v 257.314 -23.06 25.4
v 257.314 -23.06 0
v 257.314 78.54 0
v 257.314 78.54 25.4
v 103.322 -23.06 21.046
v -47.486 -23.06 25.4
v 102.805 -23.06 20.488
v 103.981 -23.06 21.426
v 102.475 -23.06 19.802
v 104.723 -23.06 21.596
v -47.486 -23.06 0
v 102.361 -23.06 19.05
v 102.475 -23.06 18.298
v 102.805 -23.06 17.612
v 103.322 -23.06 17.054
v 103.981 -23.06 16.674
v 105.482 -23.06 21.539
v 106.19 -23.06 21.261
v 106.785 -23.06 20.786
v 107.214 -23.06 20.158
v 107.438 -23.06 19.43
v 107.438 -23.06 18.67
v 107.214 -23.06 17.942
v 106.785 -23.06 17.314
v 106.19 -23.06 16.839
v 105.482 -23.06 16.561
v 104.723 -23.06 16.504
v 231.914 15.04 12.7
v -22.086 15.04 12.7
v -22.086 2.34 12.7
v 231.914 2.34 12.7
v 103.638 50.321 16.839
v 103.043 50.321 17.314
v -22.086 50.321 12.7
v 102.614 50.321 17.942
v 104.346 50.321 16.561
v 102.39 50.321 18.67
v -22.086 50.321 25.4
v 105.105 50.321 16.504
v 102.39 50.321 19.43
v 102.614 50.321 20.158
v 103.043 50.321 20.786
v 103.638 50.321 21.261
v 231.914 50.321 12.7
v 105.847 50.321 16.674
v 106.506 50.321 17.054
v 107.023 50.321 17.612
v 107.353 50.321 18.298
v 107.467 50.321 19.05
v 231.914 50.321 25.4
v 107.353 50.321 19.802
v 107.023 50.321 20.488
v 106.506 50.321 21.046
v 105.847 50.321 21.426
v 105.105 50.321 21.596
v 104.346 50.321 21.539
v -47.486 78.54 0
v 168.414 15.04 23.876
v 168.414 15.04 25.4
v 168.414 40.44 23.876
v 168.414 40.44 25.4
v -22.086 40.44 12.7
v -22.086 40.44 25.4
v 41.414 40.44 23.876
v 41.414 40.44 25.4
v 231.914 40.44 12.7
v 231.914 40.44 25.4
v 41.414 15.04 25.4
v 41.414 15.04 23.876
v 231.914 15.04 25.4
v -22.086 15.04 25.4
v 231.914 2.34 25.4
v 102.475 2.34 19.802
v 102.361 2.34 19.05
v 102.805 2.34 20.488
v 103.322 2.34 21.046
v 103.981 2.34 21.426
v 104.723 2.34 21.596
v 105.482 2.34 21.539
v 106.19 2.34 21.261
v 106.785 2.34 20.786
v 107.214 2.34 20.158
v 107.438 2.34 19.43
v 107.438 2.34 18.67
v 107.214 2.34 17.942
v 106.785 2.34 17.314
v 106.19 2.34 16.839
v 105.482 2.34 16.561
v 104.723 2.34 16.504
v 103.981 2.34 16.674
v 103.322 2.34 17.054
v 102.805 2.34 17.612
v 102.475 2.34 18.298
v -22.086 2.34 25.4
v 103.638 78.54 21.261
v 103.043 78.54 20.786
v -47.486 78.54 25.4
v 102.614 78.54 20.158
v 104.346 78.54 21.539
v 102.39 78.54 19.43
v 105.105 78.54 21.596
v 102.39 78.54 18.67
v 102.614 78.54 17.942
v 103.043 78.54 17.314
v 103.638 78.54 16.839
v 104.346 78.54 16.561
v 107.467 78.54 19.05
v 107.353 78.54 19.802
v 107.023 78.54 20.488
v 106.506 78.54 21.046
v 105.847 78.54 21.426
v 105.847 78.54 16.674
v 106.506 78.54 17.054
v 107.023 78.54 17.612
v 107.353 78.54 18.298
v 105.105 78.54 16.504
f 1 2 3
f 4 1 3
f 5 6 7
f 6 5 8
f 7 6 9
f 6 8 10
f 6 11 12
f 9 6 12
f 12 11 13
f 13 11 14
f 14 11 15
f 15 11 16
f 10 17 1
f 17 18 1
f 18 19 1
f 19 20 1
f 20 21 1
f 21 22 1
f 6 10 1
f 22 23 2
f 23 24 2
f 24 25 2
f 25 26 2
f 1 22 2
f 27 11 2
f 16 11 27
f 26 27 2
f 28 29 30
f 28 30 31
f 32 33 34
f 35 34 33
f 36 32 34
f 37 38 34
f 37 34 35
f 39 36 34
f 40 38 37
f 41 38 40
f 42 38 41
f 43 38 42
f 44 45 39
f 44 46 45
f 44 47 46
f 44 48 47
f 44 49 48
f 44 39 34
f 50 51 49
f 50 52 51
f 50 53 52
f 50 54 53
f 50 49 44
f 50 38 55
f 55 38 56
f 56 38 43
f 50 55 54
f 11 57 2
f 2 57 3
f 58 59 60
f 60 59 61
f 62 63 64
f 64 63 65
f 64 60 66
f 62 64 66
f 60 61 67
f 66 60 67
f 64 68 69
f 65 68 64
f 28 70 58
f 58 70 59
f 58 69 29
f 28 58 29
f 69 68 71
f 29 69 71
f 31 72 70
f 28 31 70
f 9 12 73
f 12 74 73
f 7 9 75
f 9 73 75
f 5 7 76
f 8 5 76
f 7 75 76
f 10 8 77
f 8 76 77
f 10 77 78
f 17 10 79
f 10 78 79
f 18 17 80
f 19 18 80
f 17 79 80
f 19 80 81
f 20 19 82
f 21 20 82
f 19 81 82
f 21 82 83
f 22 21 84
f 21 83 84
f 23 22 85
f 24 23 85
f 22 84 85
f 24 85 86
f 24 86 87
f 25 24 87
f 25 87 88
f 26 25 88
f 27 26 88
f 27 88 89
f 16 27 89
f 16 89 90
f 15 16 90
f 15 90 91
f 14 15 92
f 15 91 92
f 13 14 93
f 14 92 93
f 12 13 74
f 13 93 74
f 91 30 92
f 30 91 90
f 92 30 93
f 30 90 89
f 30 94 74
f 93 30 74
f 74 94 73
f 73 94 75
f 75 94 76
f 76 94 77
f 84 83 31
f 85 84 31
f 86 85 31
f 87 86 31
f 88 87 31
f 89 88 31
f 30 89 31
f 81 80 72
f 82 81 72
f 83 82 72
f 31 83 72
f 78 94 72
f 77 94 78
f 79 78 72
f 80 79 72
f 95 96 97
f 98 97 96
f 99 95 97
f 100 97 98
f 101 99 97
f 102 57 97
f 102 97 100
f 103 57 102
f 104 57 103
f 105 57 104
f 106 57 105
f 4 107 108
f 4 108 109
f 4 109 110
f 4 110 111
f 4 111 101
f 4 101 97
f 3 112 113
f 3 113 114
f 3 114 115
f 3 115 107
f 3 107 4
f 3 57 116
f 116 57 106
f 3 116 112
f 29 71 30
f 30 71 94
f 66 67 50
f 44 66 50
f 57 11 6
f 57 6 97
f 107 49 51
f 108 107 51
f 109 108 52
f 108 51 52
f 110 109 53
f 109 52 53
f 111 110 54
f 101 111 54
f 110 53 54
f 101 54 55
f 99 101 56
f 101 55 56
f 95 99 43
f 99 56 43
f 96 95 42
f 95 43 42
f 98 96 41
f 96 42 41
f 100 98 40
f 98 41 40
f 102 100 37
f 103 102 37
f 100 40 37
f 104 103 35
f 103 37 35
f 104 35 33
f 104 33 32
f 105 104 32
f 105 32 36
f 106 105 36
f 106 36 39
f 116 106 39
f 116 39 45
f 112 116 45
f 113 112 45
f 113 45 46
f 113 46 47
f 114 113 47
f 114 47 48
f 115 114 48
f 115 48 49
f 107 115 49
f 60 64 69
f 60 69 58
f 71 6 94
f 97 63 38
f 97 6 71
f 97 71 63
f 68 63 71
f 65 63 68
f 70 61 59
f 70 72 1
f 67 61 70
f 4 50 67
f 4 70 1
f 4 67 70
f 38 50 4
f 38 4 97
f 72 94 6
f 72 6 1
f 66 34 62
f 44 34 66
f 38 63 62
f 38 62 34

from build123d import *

# Parameters (mm, degrees)
F0_W      = 304.8
F0_H      = 101.6
F1_DEPTH  = 25.4
F2_W      = 127
F2_H      = 25.4
F3_DEPTH  = 1.524
F4_W      = 254
F4_H      = 9.8806431205
F5_DEPTH  = 12.7
F7_DEPTH  = 12.7
F9_D      = 5.1054
F9_DEPTH  = 25.4
F9_TIP    = 1.5338169022
F11_D     = 5.1054
F11_DEPTH = 28.448
F11_TIP   = 1.5338169022


with BuildPart() as f1:
    # F0 (on Top) → F1 (new body)
    with BuildSketch(Plane.XY):
        with Locations((104.9140337646, 27.7402723759)):
            Rectangle(F0_W, F0_H)
    extrude(amount=F1_DEPTH)

    # F2 (on face) → F3 (cut)
    with BuildSketch(Plane.XY.offset(25.4)):
        with Locations((104.9140337646, 27.7402723759)):
            Rectangle(F2_W, F2_H)
    extrude(amount=-F3_DEPTH, mode=Mode.SUBTRACT)

    # F4 (on face) → F5 (cut)
    with BuildSketch(Plane.XY.offset(25.4)):
        with Locations((104.9140337646, 45.3805939362)):
            Rectangle(F4_W, F4_H)
    extrude(amount=-F5_DEPTH, mode=Mode.SUBTRACT)

    # F6 (on face) → F7 (cut)
    with BuildSketch(Plane.XY.offset(25.4)):
        Polygon((41.4140337646, 15.0402723759), (-22.0859662354, 15.0402723759), (-22.0859662354, 2.3402723759), (231.9140337646, 2.3402723759), (231.9140337646, 15.0402723759), (168.4140337646, 15.0402723759), align=None)
    extrude(amount=-F7_DEPTH, mode=Mode.SUBTRACT)

    # F9
    with Locations(Plane.XZ.offset(23.0597276241)):
        with Locations((104.9140337646, 19.05)):
            Hole(F9_D / 2, depth=F9_DEPTH)
            with Locations((0, 0, -(F9_DEPTH + F9_TIP / 2))):  # 118° drill point
                Cone(0, F9_D / 2, F9_TIP, mode=Mode.SUBTRACT)

    # F11
    with Locations(Plane(origin=(0, 78.5402723759, 0), x_dir=(-1, 0, 0), z_dir=(0, 1, 0))):
        with Locations((-104.9140337646, 19.05)):
            Hole(F11_D / 2, depth=F11_DEPTH)
            with Locations((0, 0, -(F11_DEPTH + F11_TIP / 2))):  # 118° drill point
                Cone(0, F11_D / 2, F11_TIP, mode=Mode.SUBTRACT)


solid = f1.part
